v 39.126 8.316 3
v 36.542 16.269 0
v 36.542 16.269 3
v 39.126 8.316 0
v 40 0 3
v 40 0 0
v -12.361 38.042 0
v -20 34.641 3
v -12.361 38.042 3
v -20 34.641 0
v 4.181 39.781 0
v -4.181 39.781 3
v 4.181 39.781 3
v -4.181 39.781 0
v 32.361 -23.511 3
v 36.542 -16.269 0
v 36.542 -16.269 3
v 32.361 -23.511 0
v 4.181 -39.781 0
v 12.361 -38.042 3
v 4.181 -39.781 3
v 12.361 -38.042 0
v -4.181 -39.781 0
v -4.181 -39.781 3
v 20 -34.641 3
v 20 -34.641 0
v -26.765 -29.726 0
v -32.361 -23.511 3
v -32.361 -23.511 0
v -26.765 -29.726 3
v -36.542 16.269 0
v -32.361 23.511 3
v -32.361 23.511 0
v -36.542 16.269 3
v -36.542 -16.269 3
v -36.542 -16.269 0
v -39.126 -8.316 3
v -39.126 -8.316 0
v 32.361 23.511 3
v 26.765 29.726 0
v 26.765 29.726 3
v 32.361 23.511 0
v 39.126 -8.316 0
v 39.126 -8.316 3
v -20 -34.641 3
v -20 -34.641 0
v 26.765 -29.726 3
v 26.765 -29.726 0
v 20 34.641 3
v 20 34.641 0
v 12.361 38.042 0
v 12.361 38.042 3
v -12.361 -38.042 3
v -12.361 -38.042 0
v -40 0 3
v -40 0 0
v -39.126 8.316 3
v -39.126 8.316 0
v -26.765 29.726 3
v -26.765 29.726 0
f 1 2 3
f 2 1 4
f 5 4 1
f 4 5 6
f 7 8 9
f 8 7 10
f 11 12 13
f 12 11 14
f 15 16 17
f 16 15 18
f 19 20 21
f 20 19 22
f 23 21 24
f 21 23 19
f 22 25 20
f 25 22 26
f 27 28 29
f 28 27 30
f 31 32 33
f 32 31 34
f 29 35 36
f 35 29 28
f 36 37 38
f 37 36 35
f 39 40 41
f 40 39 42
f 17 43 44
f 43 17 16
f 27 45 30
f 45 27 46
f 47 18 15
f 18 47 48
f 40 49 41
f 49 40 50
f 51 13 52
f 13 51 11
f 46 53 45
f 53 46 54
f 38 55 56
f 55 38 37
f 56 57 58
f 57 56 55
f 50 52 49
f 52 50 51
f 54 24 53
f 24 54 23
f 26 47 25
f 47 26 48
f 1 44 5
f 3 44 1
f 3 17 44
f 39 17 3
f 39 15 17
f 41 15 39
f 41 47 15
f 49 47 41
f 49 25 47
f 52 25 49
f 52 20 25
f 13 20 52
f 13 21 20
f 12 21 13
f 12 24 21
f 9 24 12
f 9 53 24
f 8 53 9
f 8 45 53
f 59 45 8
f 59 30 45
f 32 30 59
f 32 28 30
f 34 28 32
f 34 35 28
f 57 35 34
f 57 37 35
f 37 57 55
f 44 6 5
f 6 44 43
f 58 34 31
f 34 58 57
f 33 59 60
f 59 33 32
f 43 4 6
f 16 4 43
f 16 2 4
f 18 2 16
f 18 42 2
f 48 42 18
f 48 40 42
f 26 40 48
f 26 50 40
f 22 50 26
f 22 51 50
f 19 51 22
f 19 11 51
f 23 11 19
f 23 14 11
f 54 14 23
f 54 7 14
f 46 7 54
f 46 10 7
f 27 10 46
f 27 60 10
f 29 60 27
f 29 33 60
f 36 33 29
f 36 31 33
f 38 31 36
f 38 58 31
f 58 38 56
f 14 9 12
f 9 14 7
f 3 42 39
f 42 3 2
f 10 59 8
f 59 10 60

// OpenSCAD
// [FL_INDEX: keywords="openscad, 3d_parametric, Moire_Coaster, csg_solid" | COT="Parametric OpenSCAD design from 3DCodeverse"]
// Title: Moire Coaster

// preview[view:south, tilt:top]

// Diameter of coaster
outer_diam = 80;

// Thickness of coaster
thickness = 3;

// Width of coaster lip
lip_width = 1;

// Moire pattern inset thickness
inset_thickness = 1;

// Number of moire curves
moire_count = 10;

// Diameter of moire curves
moire_diam = 70;

// Thickness of moire curves
moire_thickness = 3;

// Where the curve reverses direction
moire_join_angle = 40;

// Moire curve offset from center
center_diam = 10;

// Offset when drawing the reverse pattern
moire_mirror_angle = 66;

/////////////////////////////////////////////////////////////

difference()
{
  linear_extrude(height=thickness)
    circle(outer_diam/2);
  translate([0, 0, thickness - inset_thickness])
    linear_extrude(height=inset_thickness+0.1)
    {
      moire_scythe();
      rotate(moire_mirror_angle) mirror() moire_scythe();
    }
}

linear_extrude(height=thickness)
difference()
{
  circle(outer_diam/2);
  circle(outer_diam/2 - lip_width);
}

/////////////////////////////////////////////////////////////

module moire_scythe()
{
  spacing_angle = 360 / moire_count;
  join_angle = 180 + moire_join_angle;
  center_off = center_diam/2;
  inner_radius = moire_diam/4;
  outer_radius = moire_diam/3;

  circle(center_diam/2);

  for (c = [0 : moire_count-1])
  {
    rotate([0, 0, spacing_angle * c])
    union()
    {
      intersection()
      {
        translate([inner_radius-center_off, 0, 0])
          circle_trace(inner_radius);
        rotate([0, 0, join_angle])
          translate([outer_radius-center_off, 0, 0])
            circle(outer_radius);
        translate([0, -moire_diam, 0])
          square(moire_diam*2, center=true);
      }

      difference()
      {
        rotate([0, 0, join_angle])
          translate([outer_radius-center_off, 0, 0])
            difference()
            {
              circle_trace(outer_radius);
              translate([0,-moire_diam,0])
                square(moire_diam*2, center=true);
            }
        translate([inner_radius-center_off, 0, 0])
          circle(inner_radius);
      }
    }
  }
}

module circle_trace(rad)
{
  difference()
  {
    circle(rad);
    circle(rad - moire_thickness);
  }
}
